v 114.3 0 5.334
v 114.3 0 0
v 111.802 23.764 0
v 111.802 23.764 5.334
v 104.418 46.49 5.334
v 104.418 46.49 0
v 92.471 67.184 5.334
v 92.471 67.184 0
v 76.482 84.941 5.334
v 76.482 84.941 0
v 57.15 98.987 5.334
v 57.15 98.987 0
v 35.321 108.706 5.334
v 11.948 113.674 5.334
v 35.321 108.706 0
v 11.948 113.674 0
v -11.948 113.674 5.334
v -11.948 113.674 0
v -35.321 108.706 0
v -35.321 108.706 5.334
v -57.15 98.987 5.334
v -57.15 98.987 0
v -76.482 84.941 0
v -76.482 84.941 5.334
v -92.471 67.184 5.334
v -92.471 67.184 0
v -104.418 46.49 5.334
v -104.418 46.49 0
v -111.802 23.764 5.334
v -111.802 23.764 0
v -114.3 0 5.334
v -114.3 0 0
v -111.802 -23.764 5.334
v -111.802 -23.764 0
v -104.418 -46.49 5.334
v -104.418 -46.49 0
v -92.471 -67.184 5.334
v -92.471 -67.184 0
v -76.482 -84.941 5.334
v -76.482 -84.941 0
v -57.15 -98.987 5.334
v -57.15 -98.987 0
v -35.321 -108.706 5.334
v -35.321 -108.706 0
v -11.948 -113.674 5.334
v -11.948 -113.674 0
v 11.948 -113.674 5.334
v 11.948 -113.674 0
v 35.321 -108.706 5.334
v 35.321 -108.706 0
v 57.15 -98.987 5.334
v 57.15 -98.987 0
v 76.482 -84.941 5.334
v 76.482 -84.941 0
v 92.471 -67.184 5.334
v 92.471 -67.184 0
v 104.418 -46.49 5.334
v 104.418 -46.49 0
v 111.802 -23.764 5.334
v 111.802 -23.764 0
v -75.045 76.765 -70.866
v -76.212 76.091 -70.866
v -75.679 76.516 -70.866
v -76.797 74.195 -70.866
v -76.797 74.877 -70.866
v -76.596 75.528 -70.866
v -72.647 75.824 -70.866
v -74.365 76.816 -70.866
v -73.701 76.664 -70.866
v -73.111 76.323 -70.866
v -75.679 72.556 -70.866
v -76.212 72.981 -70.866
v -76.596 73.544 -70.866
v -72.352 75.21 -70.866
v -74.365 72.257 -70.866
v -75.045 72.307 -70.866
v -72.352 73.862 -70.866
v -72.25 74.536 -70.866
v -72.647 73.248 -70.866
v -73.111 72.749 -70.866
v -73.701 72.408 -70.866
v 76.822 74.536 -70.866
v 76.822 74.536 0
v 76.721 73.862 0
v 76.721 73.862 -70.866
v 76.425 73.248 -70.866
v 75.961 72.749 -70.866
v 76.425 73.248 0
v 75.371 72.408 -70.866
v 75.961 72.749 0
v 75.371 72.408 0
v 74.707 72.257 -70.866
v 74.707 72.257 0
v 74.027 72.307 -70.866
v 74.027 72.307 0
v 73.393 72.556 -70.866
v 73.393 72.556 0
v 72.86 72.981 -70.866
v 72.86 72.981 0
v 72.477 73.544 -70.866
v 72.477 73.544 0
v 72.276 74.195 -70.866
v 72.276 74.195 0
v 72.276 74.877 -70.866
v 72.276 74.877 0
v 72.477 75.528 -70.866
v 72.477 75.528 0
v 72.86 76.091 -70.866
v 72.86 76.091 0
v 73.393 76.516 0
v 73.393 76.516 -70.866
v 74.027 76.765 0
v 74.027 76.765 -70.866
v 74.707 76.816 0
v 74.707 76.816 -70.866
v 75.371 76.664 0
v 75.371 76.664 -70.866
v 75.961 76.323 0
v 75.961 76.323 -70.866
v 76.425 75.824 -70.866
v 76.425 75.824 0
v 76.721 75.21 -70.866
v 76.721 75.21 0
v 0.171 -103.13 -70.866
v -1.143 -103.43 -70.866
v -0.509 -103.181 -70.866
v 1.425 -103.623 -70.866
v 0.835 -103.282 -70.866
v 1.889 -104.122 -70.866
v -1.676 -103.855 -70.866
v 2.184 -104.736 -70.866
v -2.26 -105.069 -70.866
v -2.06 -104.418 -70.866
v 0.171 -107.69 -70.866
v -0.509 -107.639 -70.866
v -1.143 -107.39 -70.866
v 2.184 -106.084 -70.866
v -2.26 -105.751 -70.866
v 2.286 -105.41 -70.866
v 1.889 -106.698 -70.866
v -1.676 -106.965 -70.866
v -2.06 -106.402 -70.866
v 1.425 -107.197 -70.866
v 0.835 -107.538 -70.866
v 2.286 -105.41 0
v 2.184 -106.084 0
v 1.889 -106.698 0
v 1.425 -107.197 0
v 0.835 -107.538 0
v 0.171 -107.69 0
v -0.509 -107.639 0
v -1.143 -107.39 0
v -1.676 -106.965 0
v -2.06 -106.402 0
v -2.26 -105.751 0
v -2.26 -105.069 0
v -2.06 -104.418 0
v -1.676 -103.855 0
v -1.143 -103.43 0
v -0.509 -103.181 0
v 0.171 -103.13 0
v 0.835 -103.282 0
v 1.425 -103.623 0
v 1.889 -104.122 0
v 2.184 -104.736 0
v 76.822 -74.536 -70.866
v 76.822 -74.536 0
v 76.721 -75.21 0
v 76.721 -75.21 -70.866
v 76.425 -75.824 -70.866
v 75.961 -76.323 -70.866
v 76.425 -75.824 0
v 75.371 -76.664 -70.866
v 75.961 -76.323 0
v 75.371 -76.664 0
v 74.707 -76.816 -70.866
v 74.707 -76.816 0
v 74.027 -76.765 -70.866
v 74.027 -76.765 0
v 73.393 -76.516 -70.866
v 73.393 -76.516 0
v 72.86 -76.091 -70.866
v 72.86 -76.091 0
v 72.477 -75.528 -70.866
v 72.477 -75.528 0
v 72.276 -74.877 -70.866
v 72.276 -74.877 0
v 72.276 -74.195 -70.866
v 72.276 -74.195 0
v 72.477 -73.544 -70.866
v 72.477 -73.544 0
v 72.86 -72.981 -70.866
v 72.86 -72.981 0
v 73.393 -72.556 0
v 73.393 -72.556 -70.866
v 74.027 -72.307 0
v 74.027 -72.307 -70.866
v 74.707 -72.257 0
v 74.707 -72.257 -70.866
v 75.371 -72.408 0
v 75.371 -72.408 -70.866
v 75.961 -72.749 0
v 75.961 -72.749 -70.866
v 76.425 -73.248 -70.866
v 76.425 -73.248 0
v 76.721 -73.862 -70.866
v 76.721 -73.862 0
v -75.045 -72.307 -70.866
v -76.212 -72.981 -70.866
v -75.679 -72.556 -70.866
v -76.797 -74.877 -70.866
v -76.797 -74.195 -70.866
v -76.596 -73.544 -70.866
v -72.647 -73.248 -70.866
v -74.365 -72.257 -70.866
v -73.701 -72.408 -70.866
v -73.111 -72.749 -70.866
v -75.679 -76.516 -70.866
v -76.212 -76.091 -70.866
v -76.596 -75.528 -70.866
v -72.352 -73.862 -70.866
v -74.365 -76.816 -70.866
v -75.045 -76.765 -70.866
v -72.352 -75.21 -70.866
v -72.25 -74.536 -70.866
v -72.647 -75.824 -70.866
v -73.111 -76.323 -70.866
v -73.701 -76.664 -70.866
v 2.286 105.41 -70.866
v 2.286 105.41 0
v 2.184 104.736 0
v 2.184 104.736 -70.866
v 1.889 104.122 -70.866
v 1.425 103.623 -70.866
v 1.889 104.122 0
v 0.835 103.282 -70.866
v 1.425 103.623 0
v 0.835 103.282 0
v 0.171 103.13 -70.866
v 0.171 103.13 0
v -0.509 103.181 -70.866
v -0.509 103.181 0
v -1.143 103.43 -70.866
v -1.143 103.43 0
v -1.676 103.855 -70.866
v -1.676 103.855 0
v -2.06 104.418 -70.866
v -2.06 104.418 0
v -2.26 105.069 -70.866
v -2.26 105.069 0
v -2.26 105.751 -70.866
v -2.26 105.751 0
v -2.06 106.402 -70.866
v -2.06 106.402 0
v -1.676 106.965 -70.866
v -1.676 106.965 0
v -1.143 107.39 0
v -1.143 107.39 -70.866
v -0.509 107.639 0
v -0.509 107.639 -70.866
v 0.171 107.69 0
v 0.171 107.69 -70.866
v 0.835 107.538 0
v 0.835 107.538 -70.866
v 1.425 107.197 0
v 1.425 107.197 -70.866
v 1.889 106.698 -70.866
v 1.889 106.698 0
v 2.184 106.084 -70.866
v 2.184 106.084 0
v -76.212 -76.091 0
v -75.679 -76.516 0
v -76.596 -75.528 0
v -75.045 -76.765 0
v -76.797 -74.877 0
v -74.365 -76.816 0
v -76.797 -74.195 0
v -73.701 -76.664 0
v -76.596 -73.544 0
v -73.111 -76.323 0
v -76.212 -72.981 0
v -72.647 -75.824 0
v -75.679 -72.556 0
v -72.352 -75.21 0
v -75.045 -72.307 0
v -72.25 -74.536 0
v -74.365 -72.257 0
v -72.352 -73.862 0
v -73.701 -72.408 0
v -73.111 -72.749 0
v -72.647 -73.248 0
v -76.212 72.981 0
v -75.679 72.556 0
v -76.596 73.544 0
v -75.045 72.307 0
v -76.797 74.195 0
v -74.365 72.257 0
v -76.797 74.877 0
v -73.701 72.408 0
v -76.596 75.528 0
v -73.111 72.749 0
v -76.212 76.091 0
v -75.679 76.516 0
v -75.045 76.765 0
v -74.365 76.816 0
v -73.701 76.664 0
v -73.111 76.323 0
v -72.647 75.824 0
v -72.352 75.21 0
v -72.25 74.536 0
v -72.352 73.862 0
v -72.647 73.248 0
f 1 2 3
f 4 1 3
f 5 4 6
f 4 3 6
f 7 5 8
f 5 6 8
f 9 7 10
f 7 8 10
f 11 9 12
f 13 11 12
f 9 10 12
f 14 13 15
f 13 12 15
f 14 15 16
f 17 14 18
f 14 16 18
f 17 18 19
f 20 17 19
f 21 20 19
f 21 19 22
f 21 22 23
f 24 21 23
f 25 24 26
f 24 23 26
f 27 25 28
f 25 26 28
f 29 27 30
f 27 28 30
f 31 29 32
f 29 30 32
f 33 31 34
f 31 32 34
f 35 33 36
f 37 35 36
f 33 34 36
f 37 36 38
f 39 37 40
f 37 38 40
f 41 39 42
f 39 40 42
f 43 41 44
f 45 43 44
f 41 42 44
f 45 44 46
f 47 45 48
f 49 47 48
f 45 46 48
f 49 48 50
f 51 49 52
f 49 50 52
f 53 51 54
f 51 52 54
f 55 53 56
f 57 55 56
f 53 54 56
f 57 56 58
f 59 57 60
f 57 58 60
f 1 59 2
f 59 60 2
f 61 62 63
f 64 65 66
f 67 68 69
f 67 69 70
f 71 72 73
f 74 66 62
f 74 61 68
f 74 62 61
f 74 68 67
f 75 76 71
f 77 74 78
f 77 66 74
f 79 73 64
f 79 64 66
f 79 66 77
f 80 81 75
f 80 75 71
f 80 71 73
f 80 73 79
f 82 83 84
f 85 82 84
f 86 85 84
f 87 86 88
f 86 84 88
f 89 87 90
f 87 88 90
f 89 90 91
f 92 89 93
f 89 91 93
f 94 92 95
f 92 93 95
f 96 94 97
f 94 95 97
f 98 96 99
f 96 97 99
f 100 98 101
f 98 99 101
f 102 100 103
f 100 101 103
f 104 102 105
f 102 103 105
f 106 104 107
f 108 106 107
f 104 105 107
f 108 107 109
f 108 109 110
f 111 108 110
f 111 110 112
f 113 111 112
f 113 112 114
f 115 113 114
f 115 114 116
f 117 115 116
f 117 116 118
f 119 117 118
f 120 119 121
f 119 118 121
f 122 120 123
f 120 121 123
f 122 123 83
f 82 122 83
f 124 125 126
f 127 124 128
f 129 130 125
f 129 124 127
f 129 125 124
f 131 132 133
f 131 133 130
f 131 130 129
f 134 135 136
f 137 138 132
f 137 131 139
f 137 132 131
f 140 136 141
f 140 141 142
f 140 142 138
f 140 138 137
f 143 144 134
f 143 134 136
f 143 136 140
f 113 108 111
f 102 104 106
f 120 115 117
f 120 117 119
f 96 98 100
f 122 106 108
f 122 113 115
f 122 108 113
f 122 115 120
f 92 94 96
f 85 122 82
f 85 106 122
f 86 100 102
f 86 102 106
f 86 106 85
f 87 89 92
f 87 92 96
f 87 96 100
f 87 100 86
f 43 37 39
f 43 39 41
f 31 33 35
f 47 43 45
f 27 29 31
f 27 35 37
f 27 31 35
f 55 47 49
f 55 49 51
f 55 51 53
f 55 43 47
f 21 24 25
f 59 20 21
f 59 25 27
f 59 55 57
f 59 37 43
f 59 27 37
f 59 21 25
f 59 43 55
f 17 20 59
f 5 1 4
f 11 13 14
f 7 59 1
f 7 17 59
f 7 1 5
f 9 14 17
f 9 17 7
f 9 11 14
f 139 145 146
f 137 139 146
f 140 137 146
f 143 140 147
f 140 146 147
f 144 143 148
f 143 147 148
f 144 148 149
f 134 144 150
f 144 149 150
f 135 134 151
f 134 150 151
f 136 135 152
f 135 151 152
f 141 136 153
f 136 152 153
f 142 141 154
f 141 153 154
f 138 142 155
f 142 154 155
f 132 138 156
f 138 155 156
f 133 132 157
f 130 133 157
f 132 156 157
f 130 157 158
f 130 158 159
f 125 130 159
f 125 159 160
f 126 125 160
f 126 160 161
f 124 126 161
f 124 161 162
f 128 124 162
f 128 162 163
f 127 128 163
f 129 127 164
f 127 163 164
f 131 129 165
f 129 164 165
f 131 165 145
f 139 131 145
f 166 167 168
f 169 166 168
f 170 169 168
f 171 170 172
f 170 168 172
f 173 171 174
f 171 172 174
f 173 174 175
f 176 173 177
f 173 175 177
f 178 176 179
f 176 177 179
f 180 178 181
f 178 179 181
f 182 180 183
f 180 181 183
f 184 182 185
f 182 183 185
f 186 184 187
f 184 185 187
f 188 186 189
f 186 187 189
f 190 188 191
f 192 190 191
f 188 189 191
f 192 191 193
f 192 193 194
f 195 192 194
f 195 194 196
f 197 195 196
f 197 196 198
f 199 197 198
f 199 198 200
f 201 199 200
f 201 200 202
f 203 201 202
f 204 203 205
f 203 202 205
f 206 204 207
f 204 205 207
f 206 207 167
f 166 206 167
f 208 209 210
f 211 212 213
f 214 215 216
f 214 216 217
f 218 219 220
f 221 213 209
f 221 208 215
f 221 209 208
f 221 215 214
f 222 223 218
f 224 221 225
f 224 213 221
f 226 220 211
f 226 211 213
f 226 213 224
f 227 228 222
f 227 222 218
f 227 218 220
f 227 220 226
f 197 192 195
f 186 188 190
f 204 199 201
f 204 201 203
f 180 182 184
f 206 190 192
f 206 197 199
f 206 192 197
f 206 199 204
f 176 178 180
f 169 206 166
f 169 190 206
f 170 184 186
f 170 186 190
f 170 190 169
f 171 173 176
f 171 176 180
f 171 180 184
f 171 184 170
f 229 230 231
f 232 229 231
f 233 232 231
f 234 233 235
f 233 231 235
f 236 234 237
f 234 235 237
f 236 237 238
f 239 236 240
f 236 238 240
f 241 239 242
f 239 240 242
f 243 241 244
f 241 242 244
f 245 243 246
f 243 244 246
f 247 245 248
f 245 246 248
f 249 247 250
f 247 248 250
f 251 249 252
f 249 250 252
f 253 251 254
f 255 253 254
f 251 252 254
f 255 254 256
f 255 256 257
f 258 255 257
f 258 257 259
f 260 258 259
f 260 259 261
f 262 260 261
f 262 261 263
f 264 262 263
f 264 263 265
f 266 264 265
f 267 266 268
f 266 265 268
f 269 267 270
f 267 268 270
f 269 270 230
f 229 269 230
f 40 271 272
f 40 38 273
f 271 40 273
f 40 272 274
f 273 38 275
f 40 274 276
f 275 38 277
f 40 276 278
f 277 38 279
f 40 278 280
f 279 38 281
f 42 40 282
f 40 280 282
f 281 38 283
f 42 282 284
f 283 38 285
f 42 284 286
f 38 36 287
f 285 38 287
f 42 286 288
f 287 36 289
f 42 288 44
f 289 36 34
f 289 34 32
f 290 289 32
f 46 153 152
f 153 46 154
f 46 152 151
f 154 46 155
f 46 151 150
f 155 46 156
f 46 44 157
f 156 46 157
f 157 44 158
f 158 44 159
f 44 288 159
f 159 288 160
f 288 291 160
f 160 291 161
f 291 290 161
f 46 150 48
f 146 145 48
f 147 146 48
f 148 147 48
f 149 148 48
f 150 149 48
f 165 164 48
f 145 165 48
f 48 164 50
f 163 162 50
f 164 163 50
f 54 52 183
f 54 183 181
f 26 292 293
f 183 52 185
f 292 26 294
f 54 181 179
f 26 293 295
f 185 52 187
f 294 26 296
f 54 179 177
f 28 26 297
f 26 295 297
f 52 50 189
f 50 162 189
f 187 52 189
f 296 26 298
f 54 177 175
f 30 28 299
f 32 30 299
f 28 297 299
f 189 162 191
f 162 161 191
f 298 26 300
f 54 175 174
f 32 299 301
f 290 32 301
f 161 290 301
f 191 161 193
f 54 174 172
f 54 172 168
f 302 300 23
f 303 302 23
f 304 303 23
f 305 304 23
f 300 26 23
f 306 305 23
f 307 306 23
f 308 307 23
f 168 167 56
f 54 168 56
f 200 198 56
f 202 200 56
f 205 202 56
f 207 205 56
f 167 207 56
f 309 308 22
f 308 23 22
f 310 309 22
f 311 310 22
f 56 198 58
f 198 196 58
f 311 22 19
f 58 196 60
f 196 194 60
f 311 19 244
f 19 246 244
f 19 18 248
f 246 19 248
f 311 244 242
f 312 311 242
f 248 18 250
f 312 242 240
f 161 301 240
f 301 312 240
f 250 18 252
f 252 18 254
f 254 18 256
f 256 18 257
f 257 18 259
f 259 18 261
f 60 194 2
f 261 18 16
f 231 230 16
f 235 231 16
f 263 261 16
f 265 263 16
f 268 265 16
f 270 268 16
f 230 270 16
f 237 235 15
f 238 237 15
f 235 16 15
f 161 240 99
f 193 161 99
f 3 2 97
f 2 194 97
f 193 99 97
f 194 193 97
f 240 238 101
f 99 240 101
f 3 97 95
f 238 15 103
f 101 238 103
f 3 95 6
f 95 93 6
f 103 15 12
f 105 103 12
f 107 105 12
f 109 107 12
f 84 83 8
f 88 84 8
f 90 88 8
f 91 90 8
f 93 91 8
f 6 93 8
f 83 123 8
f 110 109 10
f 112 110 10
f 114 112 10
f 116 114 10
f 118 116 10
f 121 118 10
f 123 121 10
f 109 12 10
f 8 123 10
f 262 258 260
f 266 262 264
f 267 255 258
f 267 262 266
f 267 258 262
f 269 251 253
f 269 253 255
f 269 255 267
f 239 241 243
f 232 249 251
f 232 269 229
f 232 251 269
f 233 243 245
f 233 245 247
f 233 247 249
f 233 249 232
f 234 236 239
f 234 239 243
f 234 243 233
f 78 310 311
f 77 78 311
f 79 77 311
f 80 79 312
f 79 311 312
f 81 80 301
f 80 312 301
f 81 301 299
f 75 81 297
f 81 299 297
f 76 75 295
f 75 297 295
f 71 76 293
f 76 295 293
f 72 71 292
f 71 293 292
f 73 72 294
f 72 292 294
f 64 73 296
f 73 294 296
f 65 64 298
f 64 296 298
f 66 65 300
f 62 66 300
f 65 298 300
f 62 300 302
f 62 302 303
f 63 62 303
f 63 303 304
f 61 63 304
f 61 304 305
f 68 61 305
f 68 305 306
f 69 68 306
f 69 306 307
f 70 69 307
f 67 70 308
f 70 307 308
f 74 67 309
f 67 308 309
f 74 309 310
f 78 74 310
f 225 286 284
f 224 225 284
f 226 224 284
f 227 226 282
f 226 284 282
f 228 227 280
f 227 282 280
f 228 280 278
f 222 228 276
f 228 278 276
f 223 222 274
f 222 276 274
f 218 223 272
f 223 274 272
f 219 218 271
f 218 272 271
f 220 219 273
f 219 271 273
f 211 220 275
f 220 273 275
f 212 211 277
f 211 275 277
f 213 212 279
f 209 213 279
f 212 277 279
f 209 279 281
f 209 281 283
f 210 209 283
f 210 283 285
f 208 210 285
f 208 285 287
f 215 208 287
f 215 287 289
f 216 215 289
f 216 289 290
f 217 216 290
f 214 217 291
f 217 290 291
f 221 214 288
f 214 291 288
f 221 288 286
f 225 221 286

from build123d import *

# Parameters (mm, degrees)
SKETCH1_R      = 114.3
PLATFORM_DEPTH = 5.334
SKETCH3_R      = 2.286
PEGS_DEPTH     = 70.866


with BuildPart() as part:
    # Sketch1 → Platform (new body)
    with BuildSketch(Plane.XY):
        Circle(SKETCH1_R)
    extrude(amount=PLATFORM_DEPTH)

    # Sketch3 → Pegs (add)
    with BuildSketch(Plane(origin=(0, 0, 0), x_dir=(-1, 0, 0), z_dir=(0, 0, -1))):
        with Locations(Location((0, 105.41, 0), (0, 0, 180))):
            Circle(SKETCH3_R)
        with Locations(Location((-74.536125805, 74.536125805, 0), (0, 0, 180))):
            Circle(SKETCH3_R)
        with Locations(Location((-74.536125805, -74.536125805, 0), (0, 0, 180))):
            Circle(SKETCH3_R)
        with Locations(Location((0, -105.41, 0), (0, 0, 180))):
            Circle(SKETCH3_R)
        with Locations(Location((74.536125805, -74.536125805, 0), (0, 0, 180))):
            Circle(SKETCH3_R)
        with Locations(Location((74.536125805, 74.536125805, 0), (0, 0, 180))):
            Circle(SKETCH3_R)
    extrude(amount=PEGS_DEPTH)


solid = part.part
